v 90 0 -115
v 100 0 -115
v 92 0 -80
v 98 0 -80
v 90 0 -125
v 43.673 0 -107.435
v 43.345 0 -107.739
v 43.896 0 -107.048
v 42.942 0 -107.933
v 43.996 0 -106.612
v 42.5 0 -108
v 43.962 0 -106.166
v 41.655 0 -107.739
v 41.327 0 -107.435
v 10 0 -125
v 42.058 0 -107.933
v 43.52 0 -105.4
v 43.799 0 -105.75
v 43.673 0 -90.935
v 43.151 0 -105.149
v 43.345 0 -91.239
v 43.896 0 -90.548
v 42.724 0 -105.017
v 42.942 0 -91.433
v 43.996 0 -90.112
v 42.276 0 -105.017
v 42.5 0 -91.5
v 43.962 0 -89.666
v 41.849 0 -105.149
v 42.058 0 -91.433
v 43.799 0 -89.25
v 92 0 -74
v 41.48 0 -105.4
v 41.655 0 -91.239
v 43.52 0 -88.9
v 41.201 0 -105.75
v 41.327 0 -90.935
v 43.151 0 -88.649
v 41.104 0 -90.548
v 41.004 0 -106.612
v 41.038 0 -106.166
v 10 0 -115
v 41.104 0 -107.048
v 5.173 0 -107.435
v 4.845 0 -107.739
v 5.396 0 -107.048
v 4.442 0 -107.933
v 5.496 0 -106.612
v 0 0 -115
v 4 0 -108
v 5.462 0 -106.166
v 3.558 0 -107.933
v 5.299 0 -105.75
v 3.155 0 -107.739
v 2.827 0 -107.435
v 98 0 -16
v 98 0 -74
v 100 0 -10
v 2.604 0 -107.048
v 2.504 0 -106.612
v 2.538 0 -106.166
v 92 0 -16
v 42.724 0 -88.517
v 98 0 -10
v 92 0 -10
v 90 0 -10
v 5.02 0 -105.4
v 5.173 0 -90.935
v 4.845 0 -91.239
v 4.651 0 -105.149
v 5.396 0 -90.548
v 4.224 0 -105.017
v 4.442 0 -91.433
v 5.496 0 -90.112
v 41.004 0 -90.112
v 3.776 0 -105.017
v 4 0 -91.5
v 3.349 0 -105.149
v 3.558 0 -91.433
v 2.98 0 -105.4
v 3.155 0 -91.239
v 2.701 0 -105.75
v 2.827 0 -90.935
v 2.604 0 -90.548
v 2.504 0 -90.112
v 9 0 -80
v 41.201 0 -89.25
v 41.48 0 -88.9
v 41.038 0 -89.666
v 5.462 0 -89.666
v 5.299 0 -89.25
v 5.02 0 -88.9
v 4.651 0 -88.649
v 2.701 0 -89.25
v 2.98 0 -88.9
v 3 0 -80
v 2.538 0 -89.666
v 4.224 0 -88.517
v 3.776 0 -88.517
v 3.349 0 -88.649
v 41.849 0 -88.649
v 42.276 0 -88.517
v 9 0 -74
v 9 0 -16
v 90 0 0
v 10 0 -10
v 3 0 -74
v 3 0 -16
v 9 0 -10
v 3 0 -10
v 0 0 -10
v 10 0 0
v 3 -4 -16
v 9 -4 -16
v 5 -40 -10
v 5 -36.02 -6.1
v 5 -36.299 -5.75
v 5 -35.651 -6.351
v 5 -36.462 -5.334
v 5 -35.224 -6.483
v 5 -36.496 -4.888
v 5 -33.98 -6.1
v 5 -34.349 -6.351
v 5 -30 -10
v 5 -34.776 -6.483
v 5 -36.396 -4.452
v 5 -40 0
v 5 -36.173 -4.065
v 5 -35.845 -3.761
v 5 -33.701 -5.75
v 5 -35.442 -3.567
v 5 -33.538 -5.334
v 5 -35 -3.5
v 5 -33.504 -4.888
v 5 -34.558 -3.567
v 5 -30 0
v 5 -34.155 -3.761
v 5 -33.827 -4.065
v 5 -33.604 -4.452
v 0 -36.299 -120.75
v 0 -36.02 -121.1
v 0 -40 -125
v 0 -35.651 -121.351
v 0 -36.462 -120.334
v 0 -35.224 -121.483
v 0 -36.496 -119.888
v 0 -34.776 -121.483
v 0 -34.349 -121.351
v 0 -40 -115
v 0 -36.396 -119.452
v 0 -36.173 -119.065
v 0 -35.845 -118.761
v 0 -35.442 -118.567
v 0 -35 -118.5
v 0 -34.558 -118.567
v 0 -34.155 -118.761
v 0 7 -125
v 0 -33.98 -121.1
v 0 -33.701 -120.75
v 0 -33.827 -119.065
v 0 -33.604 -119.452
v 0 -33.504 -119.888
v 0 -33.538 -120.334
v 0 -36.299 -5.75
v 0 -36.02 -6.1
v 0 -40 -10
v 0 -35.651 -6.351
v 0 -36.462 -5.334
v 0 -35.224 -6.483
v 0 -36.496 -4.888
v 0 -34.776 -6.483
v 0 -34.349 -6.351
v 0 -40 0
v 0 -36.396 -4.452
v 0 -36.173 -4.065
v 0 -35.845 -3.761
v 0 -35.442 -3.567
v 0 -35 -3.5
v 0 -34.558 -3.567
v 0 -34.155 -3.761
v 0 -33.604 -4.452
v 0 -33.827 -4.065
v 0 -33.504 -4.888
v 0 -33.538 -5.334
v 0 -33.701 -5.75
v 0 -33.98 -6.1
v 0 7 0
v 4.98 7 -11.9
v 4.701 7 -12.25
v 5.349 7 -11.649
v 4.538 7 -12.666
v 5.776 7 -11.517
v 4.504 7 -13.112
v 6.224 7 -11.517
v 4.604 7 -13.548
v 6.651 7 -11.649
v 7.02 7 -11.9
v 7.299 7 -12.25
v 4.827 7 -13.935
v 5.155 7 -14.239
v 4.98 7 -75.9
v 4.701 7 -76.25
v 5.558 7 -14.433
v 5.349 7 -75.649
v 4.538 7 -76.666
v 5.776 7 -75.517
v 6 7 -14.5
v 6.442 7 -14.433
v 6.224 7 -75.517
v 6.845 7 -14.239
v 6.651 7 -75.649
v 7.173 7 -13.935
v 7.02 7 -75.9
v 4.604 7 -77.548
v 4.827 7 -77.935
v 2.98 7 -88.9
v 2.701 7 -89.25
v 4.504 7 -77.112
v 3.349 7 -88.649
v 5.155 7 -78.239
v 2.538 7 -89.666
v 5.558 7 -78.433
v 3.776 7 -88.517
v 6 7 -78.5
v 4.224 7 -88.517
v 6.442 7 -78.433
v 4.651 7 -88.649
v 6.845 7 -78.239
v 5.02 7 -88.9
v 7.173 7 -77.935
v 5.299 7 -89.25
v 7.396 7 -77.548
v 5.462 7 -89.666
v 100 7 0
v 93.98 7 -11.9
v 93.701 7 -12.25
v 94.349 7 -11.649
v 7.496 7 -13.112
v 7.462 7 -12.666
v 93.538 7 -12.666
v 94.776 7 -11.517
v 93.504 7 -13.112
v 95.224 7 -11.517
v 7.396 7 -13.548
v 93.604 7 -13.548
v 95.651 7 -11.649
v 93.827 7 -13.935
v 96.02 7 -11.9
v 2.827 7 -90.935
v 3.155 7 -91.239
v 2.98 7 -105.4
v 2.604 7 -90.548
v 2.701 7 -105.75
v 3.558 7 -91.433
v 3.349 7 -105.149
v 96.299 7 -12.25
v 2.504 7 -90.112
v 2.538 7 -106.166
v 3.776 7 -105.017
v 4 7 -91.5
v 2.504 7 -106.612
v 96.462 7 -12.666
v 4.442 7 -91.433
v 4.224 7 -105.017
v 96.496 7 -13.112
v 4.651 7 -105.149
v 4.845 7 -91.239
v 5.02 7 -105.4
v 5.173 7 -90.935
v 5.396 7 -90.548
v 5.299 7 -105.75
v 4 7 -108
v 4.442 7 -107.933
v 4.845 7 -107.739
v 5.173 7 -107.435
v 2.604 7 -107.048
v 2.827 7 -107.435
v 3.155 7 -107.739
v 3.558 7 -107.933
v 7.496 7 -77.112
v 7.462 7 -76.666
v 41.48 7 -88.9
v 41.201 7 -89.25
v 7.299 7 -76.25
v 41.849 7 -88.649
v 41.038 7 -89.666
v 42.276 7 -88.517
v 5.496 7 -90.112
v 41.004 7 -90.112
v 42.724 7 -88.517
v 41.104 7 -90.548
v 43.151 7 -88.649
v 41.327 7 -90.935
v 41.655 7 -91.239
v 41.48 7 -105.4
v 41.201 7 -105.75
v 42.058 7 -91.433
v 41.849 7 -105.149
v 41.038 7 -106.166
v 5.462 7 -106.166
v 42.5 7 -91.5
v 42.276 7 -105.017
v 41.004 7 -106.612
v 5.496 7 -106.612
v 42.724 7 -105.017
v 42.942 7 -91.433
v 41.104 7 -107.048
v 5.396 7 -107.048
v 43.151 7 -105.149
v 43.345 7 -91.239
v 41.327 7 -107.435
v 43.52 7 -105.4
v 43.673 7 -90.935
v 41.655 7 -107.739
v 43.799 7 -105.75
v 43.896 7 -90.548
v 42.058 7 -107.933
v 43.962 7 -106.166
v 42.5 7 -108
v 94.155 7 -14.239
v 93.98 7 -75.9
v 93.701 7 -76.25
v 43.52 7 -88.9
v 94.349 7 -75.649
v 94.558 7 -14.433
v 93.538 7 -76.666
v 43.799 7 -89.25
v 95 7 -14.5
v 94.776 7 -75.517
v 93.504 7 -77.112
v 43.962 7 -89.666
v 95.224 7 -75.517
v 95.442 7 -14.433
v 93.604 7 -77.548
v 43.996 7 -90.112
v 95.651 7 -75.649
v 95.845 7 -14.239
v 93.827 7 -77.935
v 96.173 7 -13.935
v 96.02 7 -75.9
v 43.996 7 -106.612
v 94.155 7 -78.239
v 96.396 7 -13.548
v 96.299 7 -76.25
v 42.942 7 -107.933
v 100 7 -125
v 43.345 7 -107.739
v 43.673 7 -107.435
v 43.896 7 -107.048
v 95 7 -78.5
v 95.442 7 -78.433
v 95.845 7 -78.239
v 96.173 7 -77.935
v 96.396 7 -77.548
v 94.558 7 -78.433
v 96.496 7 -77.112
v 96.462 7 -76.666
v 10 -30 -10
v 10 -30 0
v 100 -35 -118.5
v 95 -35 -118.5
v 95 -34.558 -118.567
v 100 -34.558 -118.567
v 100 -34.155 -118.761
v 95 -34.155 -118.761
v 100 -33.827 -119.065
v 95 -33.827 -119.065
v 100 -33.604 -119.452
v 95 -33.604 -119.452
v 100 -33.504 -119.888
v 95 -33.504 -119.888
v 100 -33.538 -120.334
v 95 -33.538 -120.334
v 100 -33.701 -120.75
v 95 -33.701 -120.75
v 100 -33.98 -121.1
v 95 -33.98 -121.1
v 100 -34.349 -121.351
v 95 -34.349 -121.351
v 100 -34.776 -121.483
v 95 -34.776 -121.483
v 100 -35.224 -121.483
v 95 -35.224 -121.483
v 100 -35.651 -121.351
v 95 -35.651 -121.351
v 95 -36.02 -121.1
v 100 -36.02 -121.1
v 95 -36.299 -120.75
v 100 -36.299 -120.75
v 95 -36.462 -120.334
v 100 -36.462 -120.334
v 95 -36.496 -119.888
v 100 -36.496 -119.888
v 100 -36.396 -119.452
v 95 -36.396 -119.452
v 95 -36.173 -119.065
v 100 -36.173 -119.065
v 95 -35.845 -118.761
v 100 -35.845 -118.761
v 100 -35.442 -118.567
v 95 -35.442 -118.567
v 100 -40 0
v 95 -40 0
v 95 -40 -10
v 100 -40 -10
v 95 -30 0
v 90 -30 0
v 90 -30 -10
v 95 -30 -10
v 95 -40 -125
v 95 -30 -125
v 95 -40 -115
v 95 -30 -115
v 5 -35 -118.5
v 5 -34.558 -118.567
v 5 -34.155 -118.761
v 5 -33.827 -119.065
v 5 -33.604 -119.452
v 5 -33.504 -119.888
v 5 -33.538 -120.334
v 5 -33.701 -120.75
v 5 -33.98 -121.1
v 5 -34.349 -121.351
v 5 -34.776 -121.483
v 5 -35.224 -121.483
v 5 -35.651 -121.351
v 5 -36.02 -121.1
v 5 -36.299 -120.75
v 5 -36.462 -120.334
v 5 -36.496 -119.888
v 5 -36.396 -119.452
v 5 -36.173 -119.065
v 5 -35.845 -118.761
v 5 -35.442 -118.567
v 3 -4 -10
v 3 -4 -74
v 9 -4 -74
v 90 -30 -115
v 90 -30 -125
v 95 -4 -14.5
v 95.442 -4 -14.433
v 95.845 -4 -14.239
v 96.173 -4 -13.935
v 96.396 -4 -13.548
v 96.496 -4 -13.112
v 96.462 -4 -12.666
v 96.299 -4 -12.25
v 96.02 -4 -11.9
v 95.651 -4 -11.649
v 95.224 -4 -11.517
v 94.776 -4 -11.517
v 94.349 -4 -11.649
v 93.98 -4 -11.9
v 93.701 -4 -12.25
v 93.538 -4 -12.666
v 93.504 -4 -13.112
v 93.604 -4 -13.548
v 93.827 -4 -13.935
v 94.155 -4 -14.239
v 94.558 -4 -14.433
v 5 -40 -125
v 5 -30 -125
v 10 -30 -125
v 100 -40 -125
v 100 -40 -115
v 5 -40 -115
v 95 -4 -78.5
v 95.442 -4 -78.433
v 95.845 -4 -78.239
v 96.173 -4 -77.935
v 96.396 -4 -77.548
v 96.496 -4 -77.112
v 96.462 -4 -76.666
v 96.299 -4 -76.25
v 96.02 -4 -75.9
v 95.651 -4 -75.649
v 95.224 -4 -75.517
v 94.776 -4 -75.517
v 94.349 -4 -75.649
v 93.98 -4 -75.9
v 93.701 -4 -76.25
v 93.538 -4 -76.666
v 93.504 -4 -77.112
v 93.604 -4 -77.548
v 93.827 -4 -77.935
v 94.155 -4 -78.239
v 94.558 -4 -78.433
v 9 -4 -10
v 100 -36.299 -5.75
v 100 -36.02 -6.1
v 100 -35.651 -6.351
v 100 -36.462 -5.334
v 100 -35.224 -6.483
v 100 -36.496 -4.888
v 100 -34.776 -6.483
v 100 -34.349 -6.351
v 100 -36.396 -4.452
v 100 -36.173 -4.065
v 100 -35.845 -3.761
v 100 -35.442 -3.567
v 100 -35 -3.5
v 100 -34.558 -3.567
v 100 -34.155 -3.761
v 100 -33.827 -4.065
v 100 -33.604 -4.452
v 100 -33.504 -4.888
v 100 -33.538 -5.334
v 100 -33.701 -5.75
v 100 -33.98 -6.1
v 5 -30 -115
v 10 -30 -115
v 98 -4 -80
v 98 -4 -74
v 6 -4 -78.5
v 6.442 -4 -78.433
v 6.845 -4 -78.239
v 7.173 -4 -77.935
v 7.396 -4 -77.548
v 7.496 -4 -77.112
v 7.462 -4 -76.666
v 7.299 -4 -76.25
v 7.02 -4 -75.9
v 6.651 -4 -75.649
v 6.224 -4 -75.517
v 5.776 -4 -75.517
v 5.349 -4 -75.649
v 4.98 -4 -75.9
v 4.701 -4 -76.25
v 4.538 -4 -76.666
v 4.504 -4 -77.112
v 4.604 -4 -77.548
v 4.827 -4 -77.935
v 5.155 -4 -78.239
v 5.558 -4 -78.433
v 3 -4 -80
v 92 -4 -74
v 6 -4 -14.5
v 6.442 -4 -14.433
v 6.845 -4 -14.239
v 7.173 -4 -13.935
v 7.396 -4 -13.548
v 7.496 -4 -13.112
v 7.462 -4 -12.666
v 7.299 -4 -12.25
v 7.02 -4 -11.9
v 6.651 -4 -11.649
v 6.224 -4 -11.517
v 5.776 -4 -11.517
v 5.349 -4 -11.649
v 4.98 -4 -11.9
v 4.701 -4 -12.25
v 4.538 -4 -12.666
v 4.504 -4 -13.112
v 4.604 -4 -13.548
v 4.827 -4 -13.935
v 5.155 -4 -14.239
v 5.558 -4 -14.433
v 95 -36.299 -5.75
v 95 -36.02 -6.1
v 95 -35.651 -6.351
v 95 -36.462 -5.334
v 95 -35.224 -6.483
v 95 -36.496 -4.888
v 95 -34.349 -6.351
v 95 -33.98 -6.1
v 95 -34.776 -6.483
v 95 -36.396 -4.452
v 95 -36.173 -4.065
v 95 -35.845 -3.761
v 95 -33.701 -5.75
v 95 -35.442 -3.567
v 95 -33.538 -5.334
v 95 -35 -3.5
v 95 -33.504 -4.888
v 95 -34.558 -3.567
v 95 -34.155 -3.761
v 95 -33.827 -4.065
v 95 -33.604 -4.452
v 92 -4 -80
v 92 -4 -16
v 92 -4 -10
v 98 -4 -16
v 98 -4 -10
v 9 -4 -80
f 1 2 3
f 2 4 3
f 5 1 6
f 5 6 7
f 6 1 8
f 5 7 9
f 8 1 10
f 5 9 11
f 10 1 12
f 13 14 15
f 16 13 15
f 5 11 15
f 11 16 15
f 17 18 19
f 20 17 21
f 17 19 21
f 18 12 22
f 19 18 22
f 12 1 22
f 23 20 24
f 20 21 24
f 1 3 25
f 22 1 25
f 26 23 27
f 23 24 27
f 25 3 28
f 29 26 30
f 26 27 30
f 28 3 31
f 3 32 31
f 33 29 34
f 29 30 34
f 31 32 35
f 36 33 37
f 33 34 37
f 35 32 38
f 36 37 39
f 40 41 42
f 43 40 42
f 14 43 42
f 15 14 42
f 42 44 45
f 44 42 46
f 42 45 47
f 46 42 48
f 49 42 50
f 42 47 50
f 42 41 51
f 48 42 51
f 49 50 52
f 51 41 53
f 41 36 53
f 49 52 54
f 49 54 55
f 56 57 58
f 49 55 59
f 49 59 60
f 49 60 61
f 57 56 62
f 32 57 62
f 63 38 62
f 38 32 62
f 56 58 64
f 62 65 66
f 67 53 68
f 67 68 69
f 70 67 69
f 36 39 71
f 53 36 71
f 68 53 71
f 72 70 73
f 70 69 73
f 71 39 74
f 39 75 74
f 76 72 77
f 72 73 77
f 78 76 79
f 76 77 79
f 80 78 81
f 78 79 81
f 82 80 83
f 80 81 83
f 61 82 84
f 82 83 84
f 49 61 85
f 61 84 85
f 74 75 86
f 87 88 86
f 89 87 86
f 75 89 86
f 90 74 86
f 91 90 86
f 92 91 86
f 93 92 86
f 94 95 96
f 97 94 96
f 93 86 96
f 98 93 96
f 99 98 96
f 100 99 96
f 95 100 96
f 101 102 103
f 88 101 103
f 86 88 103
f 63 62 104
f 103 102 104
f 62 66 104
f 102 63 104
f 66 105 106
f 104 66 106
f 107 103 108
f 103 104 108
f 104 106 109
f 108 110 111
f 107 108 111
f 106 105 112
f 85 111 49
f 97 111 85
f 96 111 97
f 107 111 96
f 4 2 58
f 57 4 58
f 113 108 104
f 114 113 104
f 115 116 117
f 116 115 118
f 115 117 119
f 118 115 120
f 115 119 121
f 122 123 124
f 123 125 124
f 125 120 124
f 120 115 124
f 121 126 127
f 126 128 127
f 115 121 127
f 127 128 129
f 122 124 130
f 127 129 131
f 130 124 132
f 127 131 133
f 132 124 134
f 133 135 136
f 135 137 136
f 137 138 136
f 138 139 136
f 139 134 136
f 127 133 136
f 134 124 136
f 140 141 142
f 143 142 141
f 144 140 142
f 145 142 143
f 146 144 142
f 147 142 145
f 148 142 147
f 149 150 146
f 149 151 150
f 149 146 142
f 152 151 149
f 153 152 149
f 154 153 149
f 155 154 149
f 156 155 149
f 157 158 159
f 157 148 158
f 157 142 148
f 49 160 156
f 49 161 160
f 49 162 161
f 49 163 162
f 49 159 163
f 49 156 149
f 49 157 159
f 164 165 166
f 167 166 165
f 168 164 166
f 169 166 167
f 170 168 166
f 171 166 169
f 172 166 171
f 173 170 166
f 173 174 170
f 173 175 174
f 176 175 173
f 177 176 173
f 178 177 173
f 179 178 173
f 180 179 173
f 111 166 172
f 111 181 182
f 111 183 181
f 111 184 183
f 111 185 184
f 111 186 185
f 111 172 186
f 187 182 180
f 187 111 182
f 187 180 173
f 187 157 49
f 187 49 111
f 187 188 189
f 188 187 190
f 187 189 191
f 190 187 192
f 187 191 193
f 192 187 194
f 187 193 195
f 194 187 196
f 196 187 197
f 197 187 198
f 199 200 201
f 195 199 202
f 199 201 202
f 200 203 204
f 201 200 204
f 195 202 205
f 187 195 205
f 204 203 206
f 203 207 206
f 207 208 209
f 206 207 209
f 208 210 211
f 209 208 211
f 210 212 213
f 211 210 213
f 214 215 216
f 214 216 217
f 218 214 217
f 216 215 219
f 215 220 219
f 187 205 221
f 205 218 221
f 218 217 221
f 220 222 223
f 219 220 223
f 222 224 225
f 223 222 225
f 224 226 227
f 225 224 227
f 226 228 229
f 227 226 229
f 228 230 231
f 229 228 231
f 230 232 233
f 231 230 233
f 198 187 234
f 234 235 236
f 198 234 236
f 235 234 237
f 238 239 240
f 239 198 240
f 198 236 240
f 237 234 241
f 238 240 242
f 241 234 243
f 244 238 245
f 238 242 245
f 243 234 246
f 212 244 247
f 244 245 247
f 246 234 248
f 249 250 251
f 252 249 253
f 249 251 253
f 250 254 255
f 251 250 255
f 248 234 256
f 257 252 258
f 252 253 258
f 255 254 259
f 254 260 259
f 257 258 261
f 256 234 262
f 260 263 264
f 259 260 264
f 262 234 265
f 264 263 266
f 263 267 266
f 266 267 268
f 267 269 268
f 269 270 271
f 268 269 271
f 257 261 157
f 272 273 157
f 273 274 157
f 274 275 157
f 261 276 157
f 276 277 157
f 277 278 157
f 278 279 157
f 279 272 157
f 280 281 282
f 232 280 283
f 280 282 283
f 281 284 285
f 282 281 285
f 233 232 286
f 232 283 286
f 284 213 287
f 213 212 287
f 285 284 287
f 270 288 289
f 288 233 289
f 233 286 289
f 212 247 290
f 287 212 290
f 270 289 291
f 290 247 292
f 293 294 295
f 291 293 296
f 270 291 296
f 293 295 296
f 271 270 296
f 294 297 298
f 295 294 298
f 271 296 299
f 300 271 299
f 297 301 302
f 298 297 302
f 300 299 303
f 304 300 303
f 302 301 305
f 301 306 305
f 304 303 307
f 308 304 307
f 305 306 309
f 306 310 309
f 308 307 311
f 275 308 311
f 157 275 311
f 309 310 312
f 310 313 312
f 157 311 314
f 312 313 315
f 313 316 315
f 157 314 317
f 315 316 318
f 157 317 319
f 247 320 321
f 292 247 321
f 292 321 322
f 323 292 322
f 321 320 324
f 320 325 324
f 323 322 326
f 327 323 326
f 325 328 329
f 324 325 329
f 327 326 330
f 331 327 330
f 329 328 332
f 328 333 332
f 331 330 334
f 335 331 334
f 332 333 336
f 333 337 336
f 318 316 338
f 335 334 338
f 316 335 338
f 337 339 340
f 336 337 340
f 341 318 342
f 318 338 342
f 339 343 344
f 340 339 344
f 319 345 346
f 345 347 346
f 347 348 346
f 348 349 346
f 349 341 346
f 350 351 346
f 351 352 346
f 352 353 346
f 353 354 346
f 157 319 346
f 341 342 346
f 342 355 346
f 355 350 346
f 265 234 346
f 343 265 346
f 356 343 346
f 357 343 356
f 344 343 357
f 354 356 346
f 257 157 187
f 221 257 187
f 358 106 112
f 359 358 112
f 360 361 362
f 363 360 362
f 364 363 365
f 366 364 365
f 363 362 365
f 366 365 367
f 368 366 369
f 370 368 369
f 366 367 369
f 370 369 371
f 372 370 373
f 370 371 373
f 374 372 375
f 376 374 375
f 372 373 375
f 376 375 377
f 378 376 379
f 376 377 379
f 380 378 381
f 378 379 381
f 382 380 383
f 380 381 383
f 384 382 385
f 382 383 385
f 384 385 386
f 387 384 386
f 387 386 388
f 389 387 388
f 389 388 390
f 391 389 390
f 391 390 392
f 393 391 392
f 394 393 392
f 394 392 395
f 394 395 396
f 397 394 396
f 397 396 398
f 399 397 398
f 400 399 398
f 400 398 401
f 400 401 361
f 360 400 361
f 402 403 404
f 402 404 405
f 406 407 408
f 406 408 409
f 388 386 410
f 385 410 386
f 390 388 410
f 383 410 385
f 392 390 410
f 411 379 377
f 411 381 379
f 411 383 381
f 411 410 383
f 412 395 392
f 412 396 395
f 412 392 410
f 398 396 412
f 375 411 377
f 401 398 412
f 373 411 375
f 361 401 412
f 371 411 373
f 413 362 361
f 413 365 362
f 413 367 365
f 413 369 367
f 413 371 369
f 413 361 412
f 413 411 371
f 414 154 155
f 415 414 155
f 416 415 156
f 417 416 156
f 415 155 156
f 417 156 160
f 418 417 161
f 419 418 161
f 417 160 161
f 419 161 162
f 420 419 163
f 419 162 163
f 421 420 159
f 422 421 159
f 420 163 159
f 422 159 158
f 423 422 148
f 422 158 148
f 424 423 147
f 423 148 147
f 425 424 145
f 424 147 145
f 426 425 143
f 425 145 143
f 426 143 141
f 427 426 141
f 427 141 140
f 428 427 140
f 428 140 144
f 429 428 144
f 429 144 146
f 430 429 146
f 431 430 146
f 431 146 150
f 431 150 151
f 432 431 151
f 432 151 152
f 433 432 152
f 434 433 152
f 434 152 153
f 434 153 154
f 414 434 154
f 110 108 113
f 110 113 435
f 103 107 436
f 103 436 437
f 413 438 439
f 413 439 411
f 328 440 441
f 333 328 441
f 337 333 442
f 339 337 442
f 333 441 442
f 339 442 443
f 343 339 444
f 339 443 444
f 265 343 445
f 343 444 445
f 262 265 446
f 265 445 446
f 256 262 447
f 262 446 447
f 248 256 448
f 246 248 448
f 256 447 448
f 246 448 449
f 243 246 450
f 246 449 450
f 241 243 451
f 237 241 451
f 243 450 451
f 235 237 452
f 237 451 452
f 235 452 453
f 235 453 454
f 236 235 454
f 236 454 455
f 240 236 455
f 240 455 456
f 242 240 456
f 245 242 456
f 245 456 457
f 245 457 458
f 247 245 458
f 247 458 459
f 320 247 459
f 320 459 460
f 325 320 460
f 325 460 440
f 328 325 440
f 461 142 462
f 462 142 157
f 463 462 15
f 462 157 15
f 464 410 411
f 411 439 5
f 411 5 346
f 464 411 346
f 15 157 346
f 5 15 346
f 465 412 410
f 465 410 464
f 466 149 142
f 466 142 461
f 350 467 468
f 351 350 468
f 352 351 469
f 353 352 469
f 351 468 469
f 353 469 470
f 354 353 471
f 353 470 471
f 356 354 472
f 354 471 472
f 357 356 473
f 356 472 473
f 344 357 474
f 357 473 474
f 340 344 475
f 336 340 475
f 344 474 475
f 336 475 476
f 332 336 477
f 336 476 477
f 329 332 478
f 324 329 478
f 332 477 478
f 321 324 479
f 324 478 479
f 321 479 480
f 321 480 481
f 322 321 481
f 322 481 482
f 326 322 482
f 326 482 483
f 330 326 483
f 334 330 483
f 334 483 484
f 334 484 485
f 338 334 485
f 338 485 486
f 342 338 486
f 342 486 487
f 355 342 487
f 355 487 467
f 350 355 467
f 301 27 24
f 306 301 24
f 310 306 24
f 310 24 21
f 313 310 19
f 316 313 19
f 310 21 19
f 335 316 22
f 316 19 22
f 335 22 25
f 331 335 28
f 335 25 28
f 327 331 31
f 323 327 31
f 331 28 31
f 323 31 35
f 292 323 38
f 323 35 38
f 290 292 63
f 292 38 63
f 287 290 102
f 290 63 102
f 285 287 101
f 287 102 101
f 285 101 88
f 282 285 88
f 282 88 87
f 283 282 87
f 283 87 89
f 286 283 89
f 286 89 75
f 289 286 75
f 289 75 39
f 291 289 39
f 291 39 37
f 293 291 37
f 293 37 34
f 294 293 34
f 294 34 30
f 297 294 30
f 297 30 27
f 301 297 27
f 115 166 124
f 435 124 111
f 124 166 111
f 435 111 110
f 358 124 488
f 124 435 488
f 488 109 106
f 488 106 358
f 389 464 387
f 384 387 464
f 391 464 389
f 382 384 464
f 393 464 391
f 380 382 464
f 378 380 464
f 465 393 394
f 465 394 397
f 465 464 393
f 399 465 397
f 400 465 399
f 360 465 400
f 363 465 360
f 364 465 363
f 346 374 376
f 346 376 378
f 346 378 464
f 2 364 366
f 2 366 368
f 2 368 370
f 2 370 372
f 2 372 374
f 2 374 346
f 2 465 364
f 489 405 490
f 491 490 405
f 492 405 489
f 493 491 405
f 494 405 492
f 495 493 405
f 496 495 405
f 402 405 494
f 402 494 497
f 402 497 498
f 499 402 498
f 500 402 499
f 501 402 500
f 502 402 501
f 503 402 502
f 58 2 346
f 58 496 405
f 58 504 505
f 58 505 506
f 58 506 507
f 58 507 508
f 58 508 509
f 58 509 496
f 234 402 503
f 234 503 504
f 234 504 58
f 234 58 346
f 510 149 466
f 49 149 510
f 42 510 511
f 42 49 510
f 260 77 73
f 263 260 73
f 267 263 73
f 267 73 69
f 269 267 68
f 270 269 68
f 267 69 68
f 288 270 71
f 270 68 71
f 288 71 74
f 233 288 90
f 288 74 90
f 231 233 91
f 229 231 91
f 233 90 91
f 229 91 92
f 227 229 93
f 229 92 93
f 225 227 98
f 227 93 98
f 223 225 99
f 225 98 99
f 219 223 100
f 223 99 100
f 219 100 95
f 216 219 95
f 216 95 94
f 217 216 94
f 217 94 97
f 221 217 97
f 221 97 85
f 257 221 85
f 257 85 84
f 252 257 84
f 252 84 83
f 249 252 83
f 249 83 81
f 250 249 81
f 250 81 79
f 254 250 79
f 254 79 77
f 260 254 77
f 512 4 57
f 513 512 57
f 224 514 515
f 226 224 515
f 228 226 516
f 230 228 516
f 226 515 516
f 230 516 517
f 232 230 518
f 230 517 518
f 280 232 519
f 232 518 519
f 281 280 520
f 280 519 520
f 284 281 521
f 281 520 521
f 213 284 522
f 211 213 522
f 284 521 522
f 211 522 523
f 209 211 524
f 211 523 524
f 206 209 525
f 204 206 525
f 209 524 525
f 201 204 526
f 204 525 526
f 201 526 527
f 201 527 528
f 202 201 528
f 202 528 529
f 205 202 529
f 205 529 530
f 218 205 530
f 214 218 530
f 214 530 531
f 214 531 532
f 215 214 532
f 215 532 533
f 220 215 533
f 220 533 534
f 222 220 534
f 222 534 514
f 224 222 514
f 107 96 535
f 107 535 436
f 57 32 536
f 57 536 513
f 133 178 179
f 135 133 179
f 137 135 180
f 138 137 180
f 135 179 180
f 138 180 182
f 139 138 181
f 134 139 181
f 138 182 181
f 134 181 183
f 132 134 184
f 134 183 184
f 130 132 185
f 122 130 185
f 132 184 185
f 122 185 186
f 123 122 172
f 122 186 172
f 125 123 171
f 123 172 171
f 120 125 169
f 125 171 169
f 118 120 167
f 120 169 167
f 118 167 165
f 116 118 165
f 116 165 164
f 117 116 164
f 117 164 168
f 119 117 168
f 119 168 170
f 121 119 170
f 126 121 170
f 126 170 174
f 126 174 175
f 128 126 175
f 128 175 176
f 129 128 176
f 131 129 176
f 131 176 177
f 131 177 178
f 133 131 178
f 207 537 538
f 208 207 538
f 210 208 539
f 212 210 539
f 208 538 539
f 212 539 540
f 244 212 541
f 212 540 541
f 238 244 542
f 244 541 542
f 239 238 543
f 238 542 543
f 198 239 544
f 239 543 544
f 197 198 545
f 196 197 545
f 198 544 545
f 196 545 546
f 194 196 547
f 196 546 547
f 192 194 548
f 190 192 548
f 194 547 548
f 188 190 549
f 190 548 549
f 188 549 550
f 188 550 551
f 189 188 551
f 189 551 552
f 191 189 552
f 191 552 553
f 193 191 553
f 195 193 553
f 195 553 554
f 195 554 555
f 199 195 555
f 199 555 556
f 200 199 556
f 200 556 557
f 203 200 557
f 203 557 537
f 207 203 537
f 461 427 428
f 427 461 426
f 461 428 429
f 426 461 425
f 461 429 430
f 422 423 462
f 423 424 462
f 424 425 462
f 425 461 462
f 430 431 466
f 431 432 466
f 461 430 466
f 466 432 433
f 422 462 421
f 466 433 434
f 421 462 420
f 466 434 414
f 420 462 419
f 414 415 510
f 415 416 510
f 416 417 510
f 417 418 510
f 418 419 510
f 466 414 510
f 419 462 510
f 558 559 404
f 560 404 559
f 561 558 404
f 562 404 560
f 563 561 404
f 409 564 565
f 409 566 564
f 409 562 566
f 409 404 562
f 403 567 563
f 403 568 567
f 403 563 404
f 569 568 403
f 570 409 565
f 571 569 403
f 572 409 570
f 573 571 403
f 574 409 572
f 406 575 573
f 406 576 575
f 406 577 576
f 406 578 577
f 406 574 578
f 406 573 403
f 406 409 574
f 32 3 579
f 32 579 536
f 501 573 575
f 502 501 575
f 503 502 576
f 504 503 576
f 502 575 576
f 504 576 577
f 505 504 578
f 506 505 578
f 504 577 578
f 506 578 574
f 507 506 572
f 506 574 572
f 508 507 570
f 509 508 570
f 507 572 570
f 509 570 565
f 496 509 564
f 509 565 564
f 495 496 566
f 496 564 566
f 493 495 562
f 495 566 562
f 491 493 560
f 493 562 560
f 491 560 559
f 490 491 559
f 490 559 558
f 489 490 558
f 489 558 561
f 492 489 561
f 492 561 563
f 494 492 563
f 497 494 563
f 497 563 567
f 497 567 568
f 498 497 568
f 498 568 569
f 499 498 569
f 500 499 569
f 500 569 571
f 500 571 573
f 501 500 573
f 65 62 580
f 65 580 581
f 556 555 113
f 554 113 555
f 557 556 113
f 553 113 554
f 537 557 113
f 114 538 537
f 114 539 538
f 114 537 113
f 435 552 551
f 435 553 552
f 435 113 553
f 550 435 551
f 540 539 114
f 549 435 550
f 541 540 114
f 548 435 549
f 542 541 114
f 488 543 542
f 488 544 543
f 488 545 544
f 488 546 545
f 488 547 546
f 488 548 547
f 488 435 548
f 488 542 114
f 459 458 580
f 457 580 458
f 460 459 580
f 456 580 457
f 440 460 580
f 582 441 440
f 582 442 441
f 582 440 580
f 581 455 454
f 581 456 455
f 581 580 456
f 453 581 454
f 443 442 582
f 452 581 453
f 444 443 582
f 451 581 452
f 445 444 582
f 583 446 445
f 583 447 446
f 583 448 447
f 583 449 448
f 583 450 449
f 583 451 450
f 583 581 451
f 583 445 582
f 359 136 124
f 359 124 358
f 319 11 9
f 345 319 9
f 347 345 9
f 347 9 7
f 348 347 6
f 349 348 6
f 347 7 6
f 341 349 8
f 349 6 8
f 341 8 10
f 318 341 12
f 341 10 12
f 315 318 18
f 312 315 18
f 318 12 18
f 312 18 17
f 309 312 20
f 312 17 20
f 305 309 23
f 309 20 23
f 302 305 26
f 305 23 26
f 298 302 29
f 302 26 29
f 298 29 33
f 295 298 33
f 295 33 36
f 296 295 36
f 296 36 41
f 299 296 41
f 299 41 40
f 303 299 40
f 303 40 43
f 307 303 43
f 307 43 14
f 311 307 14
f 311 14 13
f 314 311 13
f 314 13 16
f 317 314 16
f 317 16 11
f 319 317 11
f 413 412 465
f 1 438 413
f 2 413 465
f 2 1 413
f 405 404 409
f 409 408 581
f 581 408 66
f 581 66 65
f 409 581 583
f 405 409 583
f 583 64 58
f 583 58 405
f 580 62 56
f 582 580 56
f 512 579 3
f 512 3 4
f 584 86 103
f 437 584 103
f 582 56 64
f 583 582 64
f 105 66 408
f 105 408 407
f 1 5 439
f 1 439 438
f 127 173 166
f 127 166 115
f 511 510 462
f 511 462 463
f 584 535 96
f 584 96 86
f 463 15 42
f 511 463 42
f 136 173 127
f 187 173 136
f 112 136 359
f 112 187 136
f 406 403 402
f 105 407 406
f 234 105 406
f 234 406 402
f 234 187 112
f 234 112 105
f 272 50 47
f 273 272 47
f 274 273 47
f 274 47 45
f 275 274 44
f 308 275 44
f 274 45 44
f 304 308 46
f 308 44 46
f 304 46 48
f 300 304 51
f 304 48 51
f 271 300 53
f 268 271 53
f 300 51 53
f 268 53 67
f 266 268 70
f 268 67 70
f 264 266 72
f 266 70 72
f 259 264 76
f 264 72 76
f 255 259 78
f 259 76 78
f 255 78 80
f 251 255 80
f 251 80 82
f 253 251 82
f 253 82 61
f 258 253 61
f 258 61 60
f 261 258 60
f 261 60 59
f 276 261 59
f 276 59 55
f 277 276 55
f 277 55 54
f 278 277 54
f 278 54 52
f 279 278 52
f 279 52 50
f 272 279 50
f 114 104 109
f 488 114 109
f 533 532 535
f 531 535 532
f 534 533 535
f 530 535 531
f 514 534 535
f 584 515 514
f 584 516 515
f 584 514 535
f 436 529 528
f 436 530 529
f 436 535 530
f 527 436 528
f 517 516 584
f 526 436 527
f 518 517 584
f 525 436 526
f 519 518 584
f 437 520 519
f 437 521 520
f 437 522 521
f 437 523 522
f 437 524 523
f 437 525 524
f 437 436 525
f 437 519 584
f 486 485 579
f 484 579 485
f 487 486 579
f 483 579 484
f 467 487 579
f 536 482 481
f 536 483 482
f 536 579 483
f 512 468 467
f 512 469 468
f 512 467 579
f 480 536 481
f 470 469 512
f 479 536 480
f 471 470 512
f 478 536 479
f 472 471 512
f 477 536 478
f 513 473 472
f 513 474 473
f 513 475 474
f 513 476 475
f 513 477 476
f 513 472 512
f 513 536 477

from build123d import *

# Parameters (mm, degrees)
SKETCH2_W           = 100
SKETCH2_H           = 80
BOSS_EXTRUDE1_DEPTH = 10
SKETCH3_W           = 10
SKETCH3_H           = 10
BOSS_EXTRUDE2_DEPTH = 30
SKETCH4_W           = 5
SKETCH4_H           = 10
BOSS_EXTRUDE3_DEPTH = 10
SKETCH5_W           = 6
SKETCH5_H           = 6
BOSS_EXTRUDE4_DEPTH = 4
SKETCH6_R           = 1.5
CUT_EXTRUDE1_DEPTH  = 134.026313187
SKETCH7_W           = 100
SKETCH7_H           = 10
BOSS_EXTRUDE5_DEPTH = 45
SKETCH8_W           = 10
SKETCH8_H           = 10
BOSS_EXTRUDE6_DEPTH = 30
SKETCH9_W           = 5
SKETCH9_H           = 10
BOSS_EXTRUDE7_DEPTH = 10
SKETCH10_R          = 1.5
CUT_EXTRUDE2_DEPTH  = 166
SKETCH11_R          = 1.5
CUT_EXTRUDE3_DEPTH  = 10
CUT_EXTRUDE4_REACH  = 167
SKETCH12_W          = 125
SKETCH12_H          = 3


with BuildPart() as part:
    # Sketch2 → Boss-Extrude1 (new body)
    with BuildSketch(Plane(origin=(0, 0, 0), x_dir=(1, 0, 0), z_dir=(0, 1, 0))):
        with Locations((50, 40)):
            Rectangle(SKETCH2_W, SKETCH2_H)
    extrude(amount=BOSS_EXTRUDE1_DEPTH)

    # Sketch3 → Boss-Extrude2 (add)
    with BuildSketch(Plane.XZ):
        with Locations((95, -5)):
            Rectangle(SKETCH3_W, SKETCH3_H)
        with Locations((5, -5)):
            Rectangle(SKETCH3_W, SKETCH3_H)
    extrude(amount=BOSS_EXTRUDE2_DEPTH)

    # Sketch4 → Boss-Extrude3 (add)
    with BuildSketch(Plane.XZ.offset(30)):
        with Locations((2.5, -5)):
            Rectangle(SKETCH4_W, SKETCH4_H)
        with Locations((97.5, -5)):
            Rectangle(SKETCH4_W, SKETCH4_H)
    extrude(amount=BOSS_EXTRUDE3_DEPTH)

    # Sketch5 → Boss-Extrude4 (add)
    with BuildSketch(Plane.XZ):
        with Locations((6, -13)):
            Rectangle(SKETCH5_W, SKETCH5_H)
        with Locations((95, -13)):
            Rectangle(SKETCH5_W, SKETCH5_H)
        with Locations((95, -77)):
            Rectangle(SKETCH5_W, SKETCH5_H)
        with Locations((6, -77)):
            Rectangle(SKETCH5_W, SKETCH5_H)
    extrude(amount=BOSS_EXTRUDE4_DEPTH)

    # Sketch6 → Cut-Extrude1 (cut, through all)
    with BuildSketch(Plane.XZ.offset(4)):
        with Locations(Location((6, -13, 0), (0, 0, 270))):
            Circle(SKETCH6_R)
        with Locations(Location((95, -13, 0), (0, 0, 270))):
            Circle(SKETCH6_R)
        with Locations(Location((95, -77, 0), (0, 0, 270))):
            Circle(SKETCH6_R)
        with Locations(Location((6, -77, 0), (0, 0, 270))):
            Circle(SKETCH6_R)
    extrude(amount=-CUT_EXTRUDE1_DEPTH, mode=Mode.SUBTRACT)

    # Sketch7 → Boss-Extrude5 (add)
    with BuildSketch(Plane(origin=(0, 0, -80), x_dir=(-1, 0, 0), z_dir=(0, 0, -1))):
        with Locations((-50, 5)):
            Rectangle(SKETCH7_W, SKETCH7_H)
    extrude(amount=BOSS_EXTRUDE5_DEPTH)

    # Sketch8 → Boss-Extrude6 (add)
    with BuildSketch(Plane.XZ):
        with Locations((5, -120)):
            Rectangle(SKETCH8_W, SKETCH8_H)
        with Locations((95, -120)):
            Rectangle(SKETCH8_W, SKETCH8_H)
    extrude(amount=BOSS_EXTRUDE6_DEPTH)

    # Sketch9 → Boss-Extrude7 (add)
    with BuildSketch(Plane.XZ.offset(30)):
        with Locations((2.5, -120)):
            Rectangle(SKETCH9_W, SKETCH9_H)
        with Locations((97.5, -120)):
            Rectangle(SKETCH9_W, SKETCH9_H)
    extrude(amount=BOSS_EXTRUDE7_DEPTH)

    # Sketch10 → Cut-Extrude2 (cut, through all)
    with BuildSketch(Plane.ZY):
        with Locations((-5, -35)):
            Circle(SKETCH10_R)
        with Locations((-120, -35)):
            Circle(SKETCH10_R)
    extrude(amount=-CUT_EXTRUDE2_DEPTH, mode=Mode.SUBTRACT)

    # Sketch11 → Cut-Extrude3 (cut)
    with BuildSketch(Plane.XZ):
        with Locations(Location((4, -106.5, 0), (0, 0, 270))):
            Circle(SKETCH11_R)
        with Locations(Location((4, -90, 0), (0, 0, 270))):
            Circle(SKETCH11_R)
        with Locations(Location((42.5, -106.5, 0), (0, 0, 270))):
            Circle(SKETCH11_R)
        with Locations(Location((42.5, -90, 0), (0, 0, 270))):
            Circle(SKETCH11_R)
    extrude(amount=-CUT_EXTRUDE3_DEPTH, mode=Mode.SUBTRACT)

    # Cut-Extrude4: up to this face of the body (flat: up to its plane)
    cut_extrude4_end = Plane(part.part.faces().sort_by_distance((0, 8.653708798, -62.5))[0])
    # Sketch12 → Cut-Extrude4 (cut, up to the picked face)
    with BuildSketch(Plane(origin=(100, 0, 0), x_dir=(0, 0, -1), z_dir=(1, 0, 0)), mode=Mode.PRIVATE) as cut_extrude4_sk1:
        with Locations((62.5, 8.5)):
            Rectangle(SKETCH12_W, SKETCH12_H)
    cut_extrude4_tool1 = split(extrude(cut_extrude4_sk1.sketch, amount=-CUT_EXTRUDE4_REACH, mode=Mode.PRIVATE), bisect_by=cut_extrude4_end, keep=Keep.BOTH, mode=Mode.PRIVATE)
    add(cut_extrude4_tool1.solids().sort_by(Axis((100, 8.5, -62.5), (-1, 0, 0)))[0], mode=Mode.SUBTRACT)


solid = part.part
